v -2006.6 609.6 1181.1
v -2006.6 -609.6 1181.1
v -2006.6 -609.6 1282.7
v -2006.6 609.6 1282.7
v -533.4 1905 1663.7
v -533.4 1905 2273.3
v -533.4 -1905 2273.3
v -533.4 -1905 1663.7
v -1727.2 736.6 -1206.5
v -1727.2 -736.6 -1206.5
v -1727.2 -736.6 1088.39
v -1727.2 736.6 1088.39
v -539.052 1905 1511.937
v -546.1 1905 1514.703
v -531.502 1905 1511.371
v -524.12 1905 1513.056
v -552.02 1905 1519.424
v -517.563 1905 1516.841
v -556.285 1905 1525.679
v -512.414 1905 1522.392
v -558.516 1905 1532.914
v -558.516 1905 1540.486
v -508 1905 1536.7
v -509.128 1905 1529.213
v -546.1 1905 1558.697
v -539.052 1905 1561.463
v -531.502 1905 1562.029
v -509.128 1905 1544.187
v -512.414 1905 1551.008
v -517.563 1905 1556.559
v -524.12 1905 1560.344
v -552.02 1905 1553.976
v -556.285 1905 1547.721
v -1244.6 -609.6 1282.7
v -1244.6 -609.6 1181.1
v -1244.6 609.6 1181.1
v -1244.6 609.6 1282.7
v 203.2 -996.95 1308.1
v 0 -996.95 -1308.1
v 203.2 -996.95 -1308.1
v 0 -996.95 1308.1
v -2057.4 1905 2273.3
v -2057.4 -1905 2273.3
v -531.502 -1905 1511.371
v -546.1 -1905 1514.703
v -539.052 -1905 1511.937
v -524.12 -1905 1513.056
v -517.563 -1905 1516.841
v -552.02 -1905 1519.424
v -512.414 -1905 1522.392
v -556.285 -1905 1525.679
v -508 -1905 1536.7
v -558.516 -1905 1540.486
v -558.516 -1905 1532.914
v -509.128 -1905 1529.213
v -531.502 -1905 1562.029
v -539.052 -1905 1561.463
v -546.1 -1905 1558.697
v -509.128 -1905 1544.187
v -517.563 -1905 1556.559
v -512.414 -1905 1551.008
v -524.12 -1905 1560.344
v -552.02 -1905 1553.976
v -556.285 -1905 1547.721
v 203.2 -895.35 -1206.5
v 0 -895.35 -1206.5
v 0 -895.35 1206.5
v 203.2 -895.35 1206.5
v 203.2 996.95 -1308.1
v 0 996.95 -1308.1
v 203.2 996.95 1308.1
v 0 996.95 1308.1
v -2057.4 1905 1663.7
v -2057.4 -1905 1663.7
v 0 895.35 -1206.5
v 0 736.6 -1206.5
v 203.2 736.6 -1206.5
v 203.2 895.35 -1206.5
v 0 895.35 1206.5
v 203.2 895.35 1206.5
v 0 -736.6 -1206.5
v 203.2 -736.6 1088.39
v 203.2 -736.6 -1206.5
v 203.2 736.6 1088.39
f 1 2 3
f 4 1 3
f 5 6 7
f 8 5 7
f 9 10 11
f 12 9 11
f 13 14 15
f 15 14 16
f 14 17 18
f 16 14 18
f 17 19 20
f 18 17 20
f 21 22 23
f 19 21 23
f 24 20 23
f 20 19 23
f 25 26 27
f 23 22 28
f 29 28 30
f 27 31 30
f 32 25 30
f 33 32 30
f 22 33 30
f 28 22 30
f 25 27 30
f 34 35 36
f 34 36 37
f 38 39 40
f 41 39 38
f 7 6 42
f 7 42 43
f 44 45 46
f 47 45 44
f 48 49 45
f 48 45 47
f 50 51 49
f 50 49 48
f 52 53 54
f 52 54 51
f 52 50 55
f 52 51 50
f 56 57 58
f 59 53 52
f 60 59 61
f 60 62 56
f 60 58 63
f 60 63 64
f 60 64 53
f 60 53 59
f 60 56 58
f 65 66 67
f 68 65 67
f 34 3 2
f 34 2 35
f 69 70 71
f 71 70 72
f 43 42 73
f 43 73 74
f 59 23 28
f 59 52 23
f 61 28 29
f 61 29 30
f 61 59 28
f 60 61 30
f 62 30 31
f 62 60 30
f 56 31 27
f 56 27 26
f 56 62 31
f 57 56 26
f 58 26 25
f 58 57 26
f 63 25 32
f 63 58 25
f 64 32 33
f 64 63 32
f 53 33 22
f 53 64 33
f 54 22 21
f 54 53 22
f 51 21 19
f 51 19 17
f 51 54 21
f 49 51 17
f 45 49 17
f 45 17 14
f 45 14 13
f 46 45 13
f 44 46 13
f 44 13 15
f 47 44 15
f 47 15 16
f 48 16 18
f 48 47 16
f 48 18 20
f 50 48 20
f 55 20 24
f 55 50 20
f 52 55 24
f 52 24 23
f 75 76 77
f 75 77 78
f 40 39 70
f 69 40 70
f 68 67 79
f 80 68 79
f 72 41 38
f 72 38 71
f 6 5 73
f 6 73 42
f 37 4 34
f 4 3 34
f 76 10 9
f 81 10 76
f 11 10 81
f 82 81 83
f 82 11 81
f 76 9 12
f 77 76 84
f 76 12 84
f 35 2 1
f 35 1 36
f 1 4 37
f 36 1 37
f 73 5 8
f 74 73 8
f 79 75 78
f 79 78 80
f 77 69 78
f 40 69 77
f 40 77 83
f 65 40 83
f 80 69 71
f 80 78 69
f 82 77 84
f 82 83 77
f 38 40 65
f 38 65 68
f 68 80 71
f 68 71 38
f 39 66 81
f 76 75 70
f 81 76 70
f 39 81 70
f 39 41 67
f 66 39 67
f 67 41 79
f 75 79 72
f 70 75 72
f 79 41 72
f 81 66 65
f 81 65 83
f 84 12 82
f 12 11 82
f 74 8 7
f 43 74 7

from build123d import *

# Parameters (mm, degrees)
F0_W           = 1993.9
F0_H           = 2616.2
F0_W_2         = 1790.7
F0_H_2         = 2413
F1_DEPTH       = 203.2
F3_W           = 3810
F3_H           = 609.6
F4_DEPTH       = 1524
F5_R           = 25.4
F6_DEPTH       = 1905
F6_DEPTH_BACK  = 1905
F7_W           = 762
F7_H           = 101.6
F8_DEPTH       = 609.6
F8_DEPTH_BACK  = 609.6
F9_W           = 1930.4
F9_H           = 2294.89
F10_DEPTH      = 736.6
F10_DEPTH_BACK = 736.6


with BuildPart() as f1:
    # F0 (on Right) → F1 (new body)
    with BuildSketch(Plane.YZ):
        Rectangle(F0_W, F0_H)
        Rectangle(F0_W_2, F0_H_2, mode=Mode.SUBTRACT)
    extrude(amount=F1_DEPTH)

    # F9 (on Front) → F10 (join, two sides)
    with BuildSketch(Plane.XZ) as f10_sk:
        with Locations((-762, -59.055)):
            Rectangle(F9_W, F9_H)
    extrude(amount=F10_DEPTH)
    extrude(f10_sk.sketch, amount=-F10_DEPTH_BACK)


with BuildPart() as f4:
    # F3 (on offset) → F4 (new body)
    with BuildSketch(Plane(origin=(-533.4, 0, 0), x_dir=(0, -1, 0), z_dir=(-1, 0, 0))):
        with Locations((0, 1968.5)):
            Rectangle(F3_W, F3_H)
    extrude(amount=F4_DEPTH)


with BuildPart() as f6:
    # F5 (on Front) → F6 (new body, two sides)
    with BuildSketch(Plane.XZ) as f6_sk:
        with Locations((-533.4, 1536.7)):
            Circle(F5_R)
    extrude(amount=F6_DEPTH)
    extrude(f6_sk.sketch, amount=-F6_DEPTH_BACK)


with BuildPart() as f8:
    # F7 (on Front) → F8 (new body, two sides)
    with BuildSketch(Plane.XZ) as f8_sk:
        with Locations((-1625.6, 1231.9)):
            Rectangle(F7_W, F7_H)
    extrude(amount=F8_DEPTH)
    extrude(f8_sk.sketch, amount=-F8_DEPTH_BACK)


solid = Compound([f1.part, f4.part, f6.part, f8.part])
